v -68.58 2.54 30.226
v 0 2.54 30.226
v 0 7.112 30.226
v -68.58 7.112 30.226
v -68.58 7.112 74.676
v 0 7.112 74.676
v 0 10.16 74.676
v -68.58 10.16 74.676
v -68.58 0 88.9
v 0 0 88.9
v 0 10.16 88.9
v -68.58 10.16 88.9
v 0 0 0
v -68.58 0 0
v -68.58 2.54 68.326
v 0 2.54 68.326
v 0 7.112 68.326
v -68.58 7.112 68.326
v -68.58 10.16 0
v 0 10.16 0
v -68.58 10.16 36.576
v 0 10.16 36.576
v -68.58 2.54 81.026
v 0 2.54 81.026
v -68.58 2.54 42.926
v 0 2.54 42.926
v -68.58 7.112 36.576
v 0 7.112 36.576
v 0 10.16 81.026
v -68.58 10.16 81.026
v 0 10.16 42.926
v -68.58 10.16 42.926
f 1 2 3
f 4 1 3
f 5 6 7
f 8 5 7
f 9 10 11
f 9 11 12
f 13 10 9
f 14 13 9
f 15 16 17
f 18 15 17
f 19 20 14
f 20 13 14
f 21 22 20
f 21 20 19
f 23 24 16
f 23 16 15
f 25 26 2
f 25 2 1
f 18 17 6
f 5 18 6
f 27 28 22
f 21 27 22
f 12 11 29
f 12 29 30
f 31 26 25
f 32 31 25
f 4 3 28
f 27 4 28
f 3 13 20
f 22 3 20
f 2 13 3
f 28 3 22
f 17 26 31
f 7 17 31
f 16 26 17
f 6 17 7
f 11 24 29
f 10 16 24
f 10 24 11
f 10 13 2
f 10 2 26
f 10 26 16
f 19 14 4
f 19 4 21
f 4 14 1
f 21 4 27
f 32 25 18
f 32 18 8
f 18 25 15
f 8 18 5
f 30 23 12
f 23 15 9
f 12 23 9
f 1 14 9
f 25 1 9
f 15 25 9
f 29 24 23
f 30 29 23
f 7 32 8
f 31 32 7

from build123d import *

# Parameters (mm, degrees)
SKETCH1_W           = 68.58
SKETCH1_H           = 88.9
BOSS_EXTRUDE1_DEPTH = 2.54
SKETCH2_W           = 68.58
SKETCH2_H           = 5.08
BOSS_EXTRUDE2_DEPTH = 7.62
SKETCH3_W           = 68.58
SKETCH3_H           = 3.048
BOSS_EXTRUDE3_DEPTH = 6.35
SKETCH4_W           = 68.58
SKETCH4_H           = 3.048
BOSS_EXTRUDE4_DEPTH = 6.35
SKETCH5_W           = 68.58
SKETCH5_H           = 26.416
SKETCH5_H_2         = 21.59
SKETCH5_H_3         = 7.874
BOSS_EXTRUDE5_DEPTH = 7.62
SKETCH6_W           = 4.572
SKETCH6_H           = 1.27
SKETCH6_W_2         = 3.048
CUT_EXTRUDE1_DEPTH  = 113.737092388


with BuildPart() as part:
    # Sketch1 → Boss-Extrude1 (new body)
    with BuildSketch(Plane(origin=(0, 0, 0), x_dir=(-1, 0, 0), z_dir=(0, 1, 0))):
        with Locations((34.29, 44.45)):
            Rectangle(SKETCH1_W, SKETCH1_H)
    extrude(amount=BOSS_EXTRUDE1_DEPTH)

    # Sketch2 → Boss-Extrude2 (add)
    with BuildSketch(Plane(origin=(0, 2.54, 0), x_dir=(-1, 0, 0), z_dir=(0, 1, 0))):
        with Locations((34.29, 67.056)):
            Rectangle(SKETCH2_W, SKETCH2_H)
        with Locations((34.29, 28.956)):
            Rectangle(SKETCH2_W, SKETCH2_H)
    extrude(amount=BOSS_EXTRUDE2_DEPTH)

    # Sketch3 → Boss-Extrude3 (add)
    with BuildSketch(Plane.XY.offset(31.496)):
        with Locations((-34.29, 8.636)):
            Rectangle(SKETCH3_W, SKETCH3_H)
    extrude(amount=BOSS_EXTRUDE3_DEPTH)

    # Sketch4 → Boss-Extrude4 (add)
    with BuildSketch(Plane.XY.offset(69.596)):
        with Locations((-34.29, 8.636)):
            Rectangle(SKETCH4_W, SKETCH4_H)
    extrude(amount=BOSS_EXTRUDE4_DEPTH)

    # Sketch5 → Boss-Extrude5 (add)
    with BuildSketch(Plane(origin=(0, 2.54, 0), x_dir=(-1, 0, 0), z_dir=(0, 1, 0))):
        with Locations((34.29, 13.208)):
            Rectangle(SKETCH5_W, SKETCH5_H)
        with Locations((34.29, 53.721)):
            Rectangle(SKETCH5_W, SKETCH5_H_2)
        with Locations((34.29, 84.963)):
            Rectangle(SKETCH5_W, SKETCH5_H_3)
    extrude(amount=BOSS_EXTRUDE5_DEPTH)

    # Sketch6 → Cut-Extrude1 (cut, through all)
    with BuildSketch(Plane.YZ):
        with Locations((4.826, 68.961)):
            Rectangle(SKETCH6_W, SKETCH6_H)
        with Locations((4.826, 30.861)):
            Rectangle(SKETCH6_W, SKETCH6_H)
        with Locations((8.636, 37.211)):
            Rectangle(SKETCH6_W_2, SKETCH6_H)
        with Locations((8.636, 75.311)):
            Rectangle(SKETCH6_W_2, SKETCH6_H)
    extrude(amount=-CUT_EXTRUDE1_DEPTH, mode=Mode.SUBTRACT)


solid = part.part
